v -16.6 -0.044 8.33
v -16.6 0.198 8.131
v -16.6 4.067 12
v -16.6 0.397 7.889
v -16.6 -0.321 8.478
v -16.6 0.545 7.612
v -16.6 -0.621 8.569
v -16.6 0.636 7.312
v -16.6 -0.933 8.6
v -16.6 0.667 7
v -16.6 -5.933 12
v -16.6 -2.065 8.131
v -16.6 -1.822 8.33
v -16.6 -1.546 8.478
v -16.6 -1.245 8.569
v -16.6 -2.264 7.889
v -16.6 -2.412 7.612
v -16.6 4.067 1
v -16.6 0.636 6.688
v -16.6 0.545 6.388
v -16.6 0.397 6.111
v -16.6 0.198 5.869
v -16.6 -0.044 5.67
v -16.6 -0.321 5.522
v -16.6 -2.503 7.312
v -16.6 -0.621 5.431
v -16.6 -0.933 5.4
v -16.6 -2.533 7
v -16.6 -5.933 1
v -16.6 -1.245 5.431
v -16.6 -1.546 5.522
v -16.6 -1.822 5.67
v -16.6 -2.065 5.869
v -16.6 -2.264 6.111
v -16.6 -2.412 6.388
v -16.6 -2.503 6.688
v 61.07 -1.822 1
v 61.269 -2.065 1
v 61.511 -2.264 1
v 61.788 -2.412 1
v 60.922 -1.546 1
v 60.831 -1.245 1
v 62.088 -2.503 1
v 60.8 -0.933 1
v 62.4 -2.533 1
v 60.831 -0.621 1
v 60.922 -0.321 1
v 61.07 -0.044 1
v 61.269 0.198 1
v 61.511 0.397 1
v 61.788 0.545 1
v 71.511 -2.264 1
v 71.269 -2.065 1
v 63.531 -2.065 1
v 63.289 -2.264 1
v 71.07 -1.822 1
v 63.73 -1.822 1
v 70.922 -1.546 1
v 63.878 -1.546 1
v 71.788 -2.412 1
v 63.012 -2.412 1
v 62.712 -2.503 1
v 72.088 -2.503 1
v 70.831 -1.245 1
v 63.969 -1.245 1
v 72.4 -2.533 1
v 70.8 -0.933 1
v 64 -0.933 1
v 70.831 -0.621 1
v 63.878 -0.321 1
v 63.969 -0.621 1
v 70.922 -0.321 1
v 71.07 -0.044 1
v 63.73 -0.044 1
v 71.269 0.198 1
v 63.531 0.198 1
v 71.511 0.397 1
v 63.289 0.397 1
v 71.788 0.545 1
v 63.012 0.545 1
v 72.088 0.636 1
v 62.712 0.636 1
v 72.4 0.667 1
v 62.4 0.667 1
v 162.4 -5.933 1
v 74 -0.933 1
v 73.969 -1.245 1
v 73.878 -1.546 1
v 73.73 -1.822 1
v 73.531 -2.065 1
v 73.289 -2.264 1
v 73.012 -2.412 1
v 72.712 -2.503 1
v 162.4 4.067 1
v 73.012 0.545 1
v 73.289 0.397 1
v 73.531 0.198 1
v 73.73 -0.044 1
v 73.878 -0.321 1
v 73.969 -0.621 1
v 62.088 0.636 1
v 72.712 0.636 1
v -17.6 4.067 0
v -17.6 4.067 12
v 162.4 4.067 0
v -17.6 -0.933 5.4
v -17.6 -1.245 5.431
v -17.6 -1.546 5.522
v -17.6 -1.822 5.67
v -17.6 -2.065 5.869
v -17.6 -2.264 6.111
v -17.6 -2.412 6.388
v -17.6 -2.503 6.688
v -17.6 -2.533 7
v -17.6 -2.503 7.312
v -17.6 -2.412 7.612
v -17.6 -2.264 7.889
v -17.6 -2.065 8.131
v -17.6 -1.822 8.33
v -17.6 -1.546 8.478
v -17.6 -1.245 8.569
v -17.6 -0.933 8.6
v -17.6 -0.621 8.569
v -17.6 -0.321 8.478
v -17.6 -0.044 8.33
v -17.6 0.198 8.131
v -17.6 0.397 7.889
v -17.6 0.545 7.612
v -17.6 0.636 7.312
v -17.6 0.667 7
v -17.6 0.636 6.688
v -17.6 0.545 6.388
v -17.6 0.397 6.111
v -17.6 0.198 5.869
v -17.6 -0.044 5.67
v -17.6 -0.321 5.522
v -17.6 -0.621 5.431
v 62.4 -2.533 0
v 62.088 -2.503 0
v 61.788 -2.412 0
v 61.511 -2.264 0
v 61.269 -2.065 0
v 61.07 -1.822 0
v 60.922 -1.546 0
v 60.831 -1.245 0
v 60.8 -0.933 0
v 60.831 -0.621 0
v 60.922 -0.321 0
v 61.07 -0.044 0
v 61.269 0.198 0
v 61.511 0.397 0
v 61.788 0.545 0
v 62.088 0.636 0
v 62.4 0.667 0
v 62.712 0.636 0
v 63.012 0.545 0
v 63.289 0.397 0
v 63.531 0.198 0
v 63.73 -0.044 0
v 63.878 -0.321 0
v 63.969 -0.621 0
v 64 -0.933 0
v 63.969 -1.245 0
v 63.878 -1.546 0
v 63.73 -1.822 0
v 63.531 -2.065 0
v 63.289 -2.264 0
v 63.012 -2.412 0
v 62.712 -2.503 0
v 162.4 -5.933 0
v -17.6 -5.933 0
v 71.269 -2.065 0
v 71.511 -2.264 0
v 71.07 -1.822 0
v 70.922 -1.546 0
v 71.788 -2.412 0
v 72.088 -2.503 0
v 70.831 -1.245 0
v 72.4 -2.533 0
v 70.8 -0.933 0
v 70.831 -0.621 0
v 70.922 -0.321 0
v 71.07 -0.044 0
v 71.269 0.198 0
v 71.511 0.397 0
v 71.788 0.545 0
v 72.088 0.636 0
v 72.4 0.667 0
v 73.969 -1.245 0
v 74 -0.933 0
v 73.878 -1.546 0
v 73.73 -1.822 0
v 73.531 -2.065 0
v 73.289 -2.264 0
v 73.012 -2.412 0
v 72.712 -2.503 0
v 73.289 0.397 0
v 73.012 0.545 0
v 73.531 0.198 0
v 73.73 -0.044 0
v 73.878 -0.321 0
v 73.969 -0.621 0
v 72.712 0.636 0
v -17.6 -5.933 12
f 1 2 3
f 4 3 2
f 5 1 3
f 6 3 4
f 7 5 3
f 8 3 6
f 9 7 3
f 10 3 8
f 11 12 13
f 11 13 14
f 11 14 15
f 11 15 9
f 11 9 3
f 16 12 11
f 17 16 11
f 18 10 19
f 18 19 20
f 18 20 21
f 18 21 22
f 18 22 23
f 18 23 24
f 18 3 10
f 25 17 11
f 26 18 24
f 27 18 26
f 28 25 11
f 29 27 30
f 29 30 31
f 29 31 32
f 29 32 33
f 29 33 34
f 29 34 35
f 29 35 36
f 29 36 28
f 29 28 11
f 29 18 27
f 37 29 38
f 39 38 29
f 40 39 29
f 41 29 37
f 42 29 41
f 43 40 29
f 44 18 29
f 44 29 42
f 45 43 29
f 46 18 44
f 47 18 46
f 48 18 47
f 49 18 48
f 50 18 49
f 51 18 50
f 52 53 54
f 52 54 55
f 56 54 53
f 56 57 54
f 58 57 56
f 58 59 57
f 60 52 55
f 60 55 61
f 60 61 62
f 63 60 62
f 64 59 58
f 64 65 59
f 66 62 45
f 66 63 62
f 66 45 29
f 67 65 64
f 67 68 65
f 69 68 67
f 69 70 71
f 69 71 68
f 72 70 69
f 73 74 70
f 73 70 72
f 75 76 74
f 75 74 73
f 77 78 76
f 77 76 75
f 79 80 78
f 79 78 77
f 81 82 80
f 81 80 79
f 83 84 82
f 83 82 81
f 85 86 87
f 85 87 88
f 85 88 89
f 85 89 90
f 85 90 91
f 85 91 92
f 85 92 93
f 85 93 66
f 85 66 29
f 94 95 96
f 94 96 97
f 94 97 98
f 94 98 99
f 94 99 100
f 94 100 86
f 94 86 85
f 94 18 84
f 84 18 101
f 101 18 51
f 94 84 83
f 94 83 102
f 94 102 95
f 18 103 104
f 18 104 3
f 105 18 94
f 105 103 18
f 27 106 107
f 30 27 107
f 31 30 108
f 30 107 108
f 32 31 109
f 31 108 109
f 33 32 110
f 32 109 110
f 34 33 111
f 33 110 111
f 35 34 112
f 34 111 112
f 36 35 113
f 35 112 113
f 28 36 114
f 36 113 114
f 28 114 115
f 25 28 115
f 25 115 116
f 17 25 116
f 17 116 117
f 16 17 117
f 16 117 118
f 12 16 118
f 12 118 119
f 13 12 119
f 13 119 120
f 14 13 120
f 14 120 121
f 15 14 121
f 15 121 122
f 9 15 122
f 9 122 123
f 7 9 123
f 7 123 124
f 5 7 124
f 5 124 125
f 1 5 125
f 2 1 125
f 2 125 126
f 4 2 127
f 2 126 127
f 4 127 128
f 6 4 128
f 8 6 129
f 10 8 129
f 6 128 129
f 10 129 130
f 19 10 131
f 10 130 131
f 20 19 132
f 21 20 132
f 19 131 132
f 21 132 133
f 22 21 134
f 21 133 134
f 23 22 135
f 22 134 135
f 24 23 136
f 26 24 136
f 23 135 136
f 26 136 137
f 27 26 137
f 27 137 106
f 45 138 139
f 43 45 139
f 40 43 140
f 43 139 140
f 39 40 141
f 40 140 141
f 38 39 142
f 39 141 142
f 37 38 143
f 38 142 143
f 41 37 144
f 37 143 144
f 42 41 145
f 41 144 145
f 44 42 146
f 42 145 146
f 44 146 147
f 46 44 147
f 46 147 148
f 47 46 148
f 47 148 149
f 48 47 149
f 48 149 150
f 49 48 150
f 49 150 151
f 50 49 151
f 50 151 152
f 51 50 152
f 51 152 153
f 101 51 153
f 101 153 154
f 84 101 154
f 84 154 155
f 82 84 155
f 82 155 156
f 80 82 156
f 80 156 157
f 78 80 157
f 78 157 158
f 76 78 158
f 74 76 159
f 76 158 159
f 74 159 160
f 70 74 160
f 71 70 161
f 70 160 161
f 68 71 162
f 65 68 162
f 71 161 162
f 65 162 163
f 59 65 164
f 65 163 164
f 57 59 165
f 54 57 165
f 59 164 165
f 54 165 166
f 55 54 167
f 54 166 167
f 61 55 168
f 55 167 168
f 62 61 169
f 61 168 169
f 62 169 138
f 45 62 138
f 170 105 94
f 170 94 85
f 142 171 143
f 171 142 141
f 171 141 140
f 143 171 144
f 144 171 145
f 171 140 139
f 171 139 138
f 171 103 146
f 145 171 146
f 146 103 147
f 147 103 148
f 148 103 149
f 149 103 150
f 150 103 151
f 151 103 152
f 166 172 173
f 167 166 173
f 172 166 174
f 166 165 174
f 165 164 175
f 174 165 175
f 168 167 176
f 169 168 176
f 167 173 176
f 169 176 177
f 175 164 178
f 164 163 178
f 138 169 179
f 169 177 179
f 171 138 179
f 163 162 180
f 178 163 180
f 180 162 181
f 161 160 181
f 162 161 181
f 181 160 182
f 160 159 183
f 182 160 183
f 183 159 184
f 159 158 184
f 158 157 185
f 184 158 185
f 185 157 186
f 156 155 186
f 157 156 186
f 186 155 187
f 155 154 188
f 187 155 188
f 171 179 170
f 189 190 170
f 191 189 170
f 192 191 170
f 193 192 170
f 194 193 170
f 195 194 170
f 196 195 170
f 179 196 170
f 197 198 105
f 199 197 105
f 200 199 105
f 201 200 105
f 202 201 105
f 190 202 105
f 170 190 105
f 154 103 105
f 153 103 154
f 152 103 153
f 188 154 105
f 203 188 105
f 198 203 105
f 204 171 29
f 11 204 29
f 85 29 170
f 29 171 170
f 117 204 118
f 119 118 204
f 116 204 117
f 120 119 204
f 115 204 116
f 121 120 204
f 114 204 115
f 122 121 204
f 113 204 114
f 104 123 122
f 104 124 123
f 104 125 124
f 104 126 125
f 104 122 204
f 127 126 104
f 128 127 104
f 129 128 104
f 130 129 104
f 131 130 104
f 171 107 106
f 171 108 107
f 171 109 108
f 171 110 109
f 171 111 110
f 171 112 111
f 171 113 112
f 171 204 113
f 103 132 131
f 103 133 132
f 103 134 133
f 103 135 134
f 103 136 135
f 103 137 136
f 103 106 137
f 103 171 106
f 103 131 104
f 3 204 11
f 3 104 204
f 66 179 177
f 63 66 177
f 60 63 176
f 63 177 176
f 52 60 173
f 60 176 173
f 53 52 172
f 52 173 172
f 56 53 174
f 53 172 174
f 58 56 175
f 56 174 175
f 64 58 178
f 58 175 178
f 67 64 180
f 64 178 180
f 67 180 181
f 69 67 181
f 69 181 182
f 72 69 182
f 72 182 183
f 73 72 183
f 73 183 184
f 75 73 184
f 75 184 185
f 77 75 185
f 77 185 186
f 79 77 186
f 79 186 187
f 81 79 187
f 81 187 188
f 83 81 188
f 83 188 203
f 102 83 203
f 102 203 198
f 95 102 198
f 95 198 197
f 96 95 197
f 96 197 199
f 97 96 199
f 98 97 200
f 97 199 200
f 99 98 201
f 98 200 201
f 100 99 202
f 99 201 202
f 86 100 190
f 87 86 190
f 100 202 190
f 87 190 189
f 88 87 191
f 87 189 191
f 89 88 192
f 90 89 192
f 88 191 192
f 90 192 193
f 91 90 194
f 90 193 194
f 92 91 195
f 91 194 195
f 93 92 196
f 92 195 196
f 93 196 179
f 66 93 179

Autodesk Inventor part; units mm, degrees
ref_plane "YZ Plane" through (0, 0, 0) normal (1, 0, 0) x (0, 1, 0)
ref_plane "XZ Plane" through (0, 0, 0) normal (0, 1, 0) x (-1, 0, 0)
ref_plane "XY Plane" through (0, 0, 0) normal (0, 0, 1) x (1, 0, 0)
sketch "スケッチ1" plane through (0, 0, 0) normal (0, 0, 1) x (1, 0, 0)
  line L0 (-17.6, 4.0667) -> (162.4, 4.0667)
  line L1 (162.4, 4.0667) -> (162.4, -5.9333)
  line L2 (162.4, -5.9333) -> (-17.6, -5.9333)
  line L3 (-17.6, -5.9333) -> (-17.6, 4.0667)
  point P0 (0, 0)
  dimension "d0" = 10
  dimension "d1" = 180
extrude "押し出し1" add sketch "スケッチ1" along normal blind 1
sketch "スケッチ3" plane through (0, 0, 1) normal (0, 0, 1) x (1, 0, 0)
  circle A0 centre (62.4, -0.9333) radius 1.5
  line L0 (-17.6, 4.0667) -> (-17.6, -5.9333) projected
  line L1 (-17.6, -5.9333) -> (162.4, -5.9333) projected
  line L2 (162.4, 4.0667) -> (-17.6, 4.0667) projected
  point P0 (0, 0)
  point P1 (72.4, -0.9333)
  dimension "d14" = 3
  dimension "d15" = 80
  dimension "d16" = 5
  dimension "d24" = 10
  dimension "d25" = 5
hole "穴2" at (62.4, -0.9333, 1) at (72.4, -0.9333, 1) direction (0, 0, -1) diameter 3.2 end through all
sketch "スケッチ4" plane through (0, 0, 1) normal (0, 0, 1) x (1, 0, 0)
  line L0 (-17.6, -5.9333) -> (162.4, -5.9333) projected
  line L1 (-17.6, 4.0667) -> (-16.6, 4.0667)
  line L2 (-16.6, 4.0667) -> (-16.6, -5.9333)
  line L3 (-16.6, -5.9333) -> (-17.6, -5.9333)
  line L4 (-17.6, -5.9333) -> (-17.6, 4.0667)
  point P0 (0, 0)
  dimension "d26" = 1
extrude "押し出し2" add sketch "スケッチ4" along normal blind 11
sketch "スケッチ5" plane through (-16.6, -5.9333, 1) normal (1, 0, 0) x (0, 0, -1)
  line L0 (-11, 0) -> (-11, 10) projected
  line L1 (0, 0) -> (-11, 0) projected
  point P0 (1, 5.9333)
  point P1 (-6, 5)
  dimension "d29" = 5
  dimension "d30" = 5
hole "穴3" at (-16.6, -0.9333, 7) direction (-1, 0, 0) diameter 3.2 end through all
properties part number "爪２" material "アルミニウム 6061"
